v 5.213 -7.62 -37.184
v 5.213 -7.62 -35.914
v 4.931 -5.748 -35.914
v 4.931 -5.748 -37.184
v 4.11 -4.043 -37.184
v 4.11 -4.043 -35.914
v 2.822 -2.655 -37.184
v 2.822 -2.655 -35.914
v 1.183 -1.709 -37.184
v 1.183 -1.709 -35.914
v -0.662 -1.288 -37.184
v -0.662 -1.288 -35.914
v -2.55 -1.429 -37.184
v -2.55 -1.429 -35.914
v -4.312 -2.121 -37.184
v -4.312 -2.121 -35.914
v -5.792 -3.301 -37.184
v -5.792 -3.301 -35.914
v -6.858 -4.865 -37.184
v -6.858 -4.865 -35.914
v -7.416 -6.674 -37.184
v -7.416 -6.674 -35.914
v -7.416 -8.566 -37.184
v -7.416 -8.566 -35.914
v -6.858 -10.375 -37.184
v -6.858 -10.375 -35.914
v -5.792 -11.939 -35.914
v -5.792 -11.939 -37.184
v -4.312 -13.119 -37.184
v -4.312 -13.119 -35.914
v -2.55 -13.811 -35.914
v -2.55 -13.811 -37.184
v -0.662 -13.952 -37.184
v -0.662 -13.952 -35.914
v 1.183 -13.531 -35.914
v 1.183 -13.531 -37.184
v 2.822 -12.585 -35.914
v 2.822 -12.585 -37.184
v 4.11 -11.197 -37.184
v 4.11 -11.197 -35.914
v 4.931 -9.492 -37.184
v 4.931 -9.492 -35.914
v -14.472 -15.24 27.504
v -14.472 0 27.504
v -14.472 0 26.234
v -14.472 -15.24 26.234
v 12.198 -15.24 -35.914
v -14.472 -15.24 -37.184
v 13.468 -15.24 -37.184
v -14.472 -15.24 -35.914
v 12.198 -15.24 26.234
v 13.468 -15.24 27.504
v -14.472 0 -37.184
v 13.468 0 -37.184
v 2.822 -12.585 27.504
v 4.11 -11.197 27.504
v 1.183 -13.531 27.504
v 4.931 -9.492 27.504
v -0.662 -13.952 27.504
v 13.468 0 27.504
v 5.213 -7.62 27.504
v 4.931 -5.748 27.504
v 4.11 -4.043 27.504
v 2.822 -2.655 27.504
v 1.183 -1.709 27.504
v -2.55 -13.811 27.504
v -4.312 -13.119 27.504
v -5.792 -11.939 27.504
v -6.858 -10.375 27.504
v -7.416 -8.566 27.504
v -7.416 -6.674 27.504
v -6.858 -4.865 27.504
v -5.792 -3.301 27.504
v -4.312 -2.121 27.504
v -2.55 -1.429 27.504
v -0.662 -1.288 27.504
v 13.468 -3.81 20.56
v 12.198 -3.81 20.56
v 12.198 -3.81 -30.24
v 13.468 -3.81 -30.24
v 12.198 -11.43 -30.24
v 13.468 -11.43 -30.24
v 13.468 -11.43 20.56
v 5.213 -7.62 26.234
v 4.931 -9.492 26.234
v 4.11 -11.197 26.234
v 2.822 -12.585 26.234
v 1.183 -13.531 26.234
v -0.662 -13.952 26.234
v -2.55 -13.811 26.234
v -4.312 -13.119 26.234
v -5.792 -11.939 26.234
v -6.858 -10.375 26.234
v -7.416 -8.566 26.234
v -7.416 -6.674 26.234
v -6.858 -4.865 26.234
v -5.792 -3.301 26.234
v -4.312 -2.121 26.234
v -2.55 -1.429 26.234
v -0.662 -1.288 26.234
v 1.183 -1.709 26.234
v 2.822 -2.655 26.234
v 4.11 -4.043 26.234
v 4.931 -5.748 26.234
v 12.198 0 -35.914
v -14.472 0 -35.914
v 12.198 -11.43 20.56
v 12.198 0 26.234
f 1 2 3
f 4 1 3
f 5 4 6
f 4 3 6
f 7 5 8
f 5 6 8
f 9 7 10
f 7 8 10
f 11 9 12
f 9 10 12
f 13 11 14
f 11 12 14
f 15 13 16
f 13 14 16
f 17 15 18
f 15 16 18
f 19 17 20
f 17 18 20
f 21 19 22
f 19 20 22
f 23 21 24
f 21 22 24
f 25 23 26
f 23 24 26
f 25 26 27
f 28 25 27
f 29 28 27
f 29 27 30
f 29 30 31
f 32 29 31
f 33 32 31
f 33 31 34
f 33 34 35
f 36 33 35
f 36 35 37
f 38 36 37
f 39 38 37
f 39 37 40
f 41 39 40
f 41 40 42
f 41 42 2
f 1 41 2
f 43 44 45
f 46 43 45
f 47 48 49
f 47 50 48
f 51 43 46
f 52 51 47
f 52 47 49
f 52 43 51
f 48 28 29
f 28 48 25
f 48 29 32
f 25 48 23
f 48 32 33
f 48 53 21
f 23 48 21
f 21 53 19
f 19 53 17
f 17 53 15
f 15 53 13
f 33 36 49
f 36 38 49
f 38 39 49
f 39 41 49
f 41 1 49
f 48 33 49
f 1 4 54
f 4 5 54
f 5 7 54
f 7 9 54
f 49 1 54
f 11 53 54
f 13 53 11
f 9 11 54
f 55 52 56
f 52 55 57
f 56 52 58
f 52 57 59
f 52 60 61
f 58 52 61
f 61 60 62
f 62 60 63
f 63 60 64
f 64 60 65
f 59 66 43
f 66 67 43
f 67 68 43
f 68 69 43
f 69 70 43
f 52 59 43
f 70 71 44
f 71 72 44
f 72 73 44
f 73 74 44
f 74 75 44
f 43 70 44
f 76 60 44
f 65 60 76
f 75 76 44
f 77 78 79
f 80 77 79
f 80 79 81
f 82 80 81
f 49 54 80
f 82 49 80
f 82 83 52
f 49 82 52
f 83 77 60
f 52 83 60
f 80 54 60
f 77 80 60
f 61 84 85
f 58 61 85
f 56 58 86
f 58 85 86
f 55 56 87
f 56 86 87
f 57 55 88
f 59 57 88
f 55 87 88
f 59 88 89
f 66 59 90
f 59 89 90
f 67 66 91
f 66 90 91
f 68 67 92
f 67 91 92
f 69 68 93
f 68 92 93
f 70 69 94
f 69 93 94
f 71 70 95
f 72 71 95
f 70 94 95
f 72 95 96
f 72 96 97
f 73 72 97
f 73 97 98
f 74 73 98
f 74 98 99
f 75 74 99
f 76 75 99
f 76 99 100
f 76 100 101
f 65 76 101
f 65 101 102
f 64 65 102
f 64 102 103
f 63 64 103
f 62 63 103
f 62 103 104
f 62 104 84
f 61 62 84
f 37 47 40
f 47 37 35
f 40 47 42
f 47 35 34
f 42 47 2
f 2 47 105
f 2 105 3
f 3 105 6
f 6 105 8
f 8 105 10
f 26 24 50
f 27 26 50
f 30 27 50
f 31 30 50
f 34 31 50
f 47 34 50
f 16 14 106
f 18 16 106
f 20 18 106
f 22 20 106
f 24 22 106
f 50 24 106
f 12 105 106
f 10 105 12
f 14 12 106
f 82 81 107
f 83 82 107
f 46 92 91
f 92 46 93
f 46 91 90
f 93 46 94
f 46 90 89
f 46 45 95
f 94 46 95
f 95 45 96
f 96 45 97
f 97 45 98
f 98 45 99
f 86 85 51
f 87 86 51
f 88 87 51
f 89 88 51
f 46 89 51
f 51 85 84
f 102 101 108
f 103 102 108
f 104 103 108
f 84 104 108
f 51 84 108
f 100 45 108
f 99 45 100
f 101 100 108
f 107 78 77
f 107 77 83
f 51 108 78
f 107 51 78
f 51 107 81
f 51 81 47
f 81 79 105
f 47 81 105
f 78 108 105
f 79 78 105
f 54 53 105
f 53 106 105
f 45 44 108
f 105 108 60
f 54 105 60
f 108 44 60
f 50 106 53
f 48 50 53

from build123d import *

# Parameters (mm, degrees)
F1_DEPTH       = 15.24
F4_D           = 12.7
F4_DEPTH       = 1.271
F4_ON_F2_D     = 12.7
F4_ON_F2_DEPTH = 1.271
F5_W           = 7.62
F5_H           = 25.4
F6_DEPTH       = 25.4


# Not quite as in the source:
# - a feature names something its author has since deleted; it is built from what else it names


with BuildPart() as f1:
    # F0 (on Front) → F1 (new body)
    with BuildSketch(Plane.XZ):
        Polygon((-14.4720045709, -37.1843738795), (13.4679954291, -37.1843738795), (13.4679954291, 27.5043461205), (-14.4720045709, 27.5043461205), (-14.4720045709, 26.2343461205), (12.1979954291, 26.2343461205), (12.1979954291, -35.9143738795), (-14.4720045709, -35.9143738795), align=None)
    extrude(amount=F1_DEPTH)

    # F4 (through all, one way)
    with BuildSketch(Plane.XY.offset(-35.9143738795)):
        with Locations((-1.1370045709, -7.62)):
            Circle(F4_D / 2)
    extrude(amount=-F4_DEPTH, mode=Mode.SUBTRACT)

    # F4 on F2 (through all, one way)
    with BuildSketch(Plane(origin=(0, 0, 26.2343461205), x_dir=(1, 0, 0), z_dir=(0, 0, -1))):
        with Locations((-1.1370045709, 7.62)):
            Circle(F4_ON_F2_D / 2)
    extrude(amount=-F4_ON_F2_DEPTH, mode=Mode.SUBTRACT)

    # F5 (on face) → F6 (cut)
    with BuildSketch(Plane(origin=(12.1979954291, 0, 0), x_dir=(0, -1, 0), z_dir=(-1, 0, 0))):
        with Locations((7.62, -17.5400138795)):
            Rectangle(F5_W, F5_H)
        with Locations((7.62, 7.8599861205)):
            Rectangle(F5_W, F5_H)
    extrude(amount=-F6_DEPTH, mode=Mode.SUBTRACT)


solid = f1.part
